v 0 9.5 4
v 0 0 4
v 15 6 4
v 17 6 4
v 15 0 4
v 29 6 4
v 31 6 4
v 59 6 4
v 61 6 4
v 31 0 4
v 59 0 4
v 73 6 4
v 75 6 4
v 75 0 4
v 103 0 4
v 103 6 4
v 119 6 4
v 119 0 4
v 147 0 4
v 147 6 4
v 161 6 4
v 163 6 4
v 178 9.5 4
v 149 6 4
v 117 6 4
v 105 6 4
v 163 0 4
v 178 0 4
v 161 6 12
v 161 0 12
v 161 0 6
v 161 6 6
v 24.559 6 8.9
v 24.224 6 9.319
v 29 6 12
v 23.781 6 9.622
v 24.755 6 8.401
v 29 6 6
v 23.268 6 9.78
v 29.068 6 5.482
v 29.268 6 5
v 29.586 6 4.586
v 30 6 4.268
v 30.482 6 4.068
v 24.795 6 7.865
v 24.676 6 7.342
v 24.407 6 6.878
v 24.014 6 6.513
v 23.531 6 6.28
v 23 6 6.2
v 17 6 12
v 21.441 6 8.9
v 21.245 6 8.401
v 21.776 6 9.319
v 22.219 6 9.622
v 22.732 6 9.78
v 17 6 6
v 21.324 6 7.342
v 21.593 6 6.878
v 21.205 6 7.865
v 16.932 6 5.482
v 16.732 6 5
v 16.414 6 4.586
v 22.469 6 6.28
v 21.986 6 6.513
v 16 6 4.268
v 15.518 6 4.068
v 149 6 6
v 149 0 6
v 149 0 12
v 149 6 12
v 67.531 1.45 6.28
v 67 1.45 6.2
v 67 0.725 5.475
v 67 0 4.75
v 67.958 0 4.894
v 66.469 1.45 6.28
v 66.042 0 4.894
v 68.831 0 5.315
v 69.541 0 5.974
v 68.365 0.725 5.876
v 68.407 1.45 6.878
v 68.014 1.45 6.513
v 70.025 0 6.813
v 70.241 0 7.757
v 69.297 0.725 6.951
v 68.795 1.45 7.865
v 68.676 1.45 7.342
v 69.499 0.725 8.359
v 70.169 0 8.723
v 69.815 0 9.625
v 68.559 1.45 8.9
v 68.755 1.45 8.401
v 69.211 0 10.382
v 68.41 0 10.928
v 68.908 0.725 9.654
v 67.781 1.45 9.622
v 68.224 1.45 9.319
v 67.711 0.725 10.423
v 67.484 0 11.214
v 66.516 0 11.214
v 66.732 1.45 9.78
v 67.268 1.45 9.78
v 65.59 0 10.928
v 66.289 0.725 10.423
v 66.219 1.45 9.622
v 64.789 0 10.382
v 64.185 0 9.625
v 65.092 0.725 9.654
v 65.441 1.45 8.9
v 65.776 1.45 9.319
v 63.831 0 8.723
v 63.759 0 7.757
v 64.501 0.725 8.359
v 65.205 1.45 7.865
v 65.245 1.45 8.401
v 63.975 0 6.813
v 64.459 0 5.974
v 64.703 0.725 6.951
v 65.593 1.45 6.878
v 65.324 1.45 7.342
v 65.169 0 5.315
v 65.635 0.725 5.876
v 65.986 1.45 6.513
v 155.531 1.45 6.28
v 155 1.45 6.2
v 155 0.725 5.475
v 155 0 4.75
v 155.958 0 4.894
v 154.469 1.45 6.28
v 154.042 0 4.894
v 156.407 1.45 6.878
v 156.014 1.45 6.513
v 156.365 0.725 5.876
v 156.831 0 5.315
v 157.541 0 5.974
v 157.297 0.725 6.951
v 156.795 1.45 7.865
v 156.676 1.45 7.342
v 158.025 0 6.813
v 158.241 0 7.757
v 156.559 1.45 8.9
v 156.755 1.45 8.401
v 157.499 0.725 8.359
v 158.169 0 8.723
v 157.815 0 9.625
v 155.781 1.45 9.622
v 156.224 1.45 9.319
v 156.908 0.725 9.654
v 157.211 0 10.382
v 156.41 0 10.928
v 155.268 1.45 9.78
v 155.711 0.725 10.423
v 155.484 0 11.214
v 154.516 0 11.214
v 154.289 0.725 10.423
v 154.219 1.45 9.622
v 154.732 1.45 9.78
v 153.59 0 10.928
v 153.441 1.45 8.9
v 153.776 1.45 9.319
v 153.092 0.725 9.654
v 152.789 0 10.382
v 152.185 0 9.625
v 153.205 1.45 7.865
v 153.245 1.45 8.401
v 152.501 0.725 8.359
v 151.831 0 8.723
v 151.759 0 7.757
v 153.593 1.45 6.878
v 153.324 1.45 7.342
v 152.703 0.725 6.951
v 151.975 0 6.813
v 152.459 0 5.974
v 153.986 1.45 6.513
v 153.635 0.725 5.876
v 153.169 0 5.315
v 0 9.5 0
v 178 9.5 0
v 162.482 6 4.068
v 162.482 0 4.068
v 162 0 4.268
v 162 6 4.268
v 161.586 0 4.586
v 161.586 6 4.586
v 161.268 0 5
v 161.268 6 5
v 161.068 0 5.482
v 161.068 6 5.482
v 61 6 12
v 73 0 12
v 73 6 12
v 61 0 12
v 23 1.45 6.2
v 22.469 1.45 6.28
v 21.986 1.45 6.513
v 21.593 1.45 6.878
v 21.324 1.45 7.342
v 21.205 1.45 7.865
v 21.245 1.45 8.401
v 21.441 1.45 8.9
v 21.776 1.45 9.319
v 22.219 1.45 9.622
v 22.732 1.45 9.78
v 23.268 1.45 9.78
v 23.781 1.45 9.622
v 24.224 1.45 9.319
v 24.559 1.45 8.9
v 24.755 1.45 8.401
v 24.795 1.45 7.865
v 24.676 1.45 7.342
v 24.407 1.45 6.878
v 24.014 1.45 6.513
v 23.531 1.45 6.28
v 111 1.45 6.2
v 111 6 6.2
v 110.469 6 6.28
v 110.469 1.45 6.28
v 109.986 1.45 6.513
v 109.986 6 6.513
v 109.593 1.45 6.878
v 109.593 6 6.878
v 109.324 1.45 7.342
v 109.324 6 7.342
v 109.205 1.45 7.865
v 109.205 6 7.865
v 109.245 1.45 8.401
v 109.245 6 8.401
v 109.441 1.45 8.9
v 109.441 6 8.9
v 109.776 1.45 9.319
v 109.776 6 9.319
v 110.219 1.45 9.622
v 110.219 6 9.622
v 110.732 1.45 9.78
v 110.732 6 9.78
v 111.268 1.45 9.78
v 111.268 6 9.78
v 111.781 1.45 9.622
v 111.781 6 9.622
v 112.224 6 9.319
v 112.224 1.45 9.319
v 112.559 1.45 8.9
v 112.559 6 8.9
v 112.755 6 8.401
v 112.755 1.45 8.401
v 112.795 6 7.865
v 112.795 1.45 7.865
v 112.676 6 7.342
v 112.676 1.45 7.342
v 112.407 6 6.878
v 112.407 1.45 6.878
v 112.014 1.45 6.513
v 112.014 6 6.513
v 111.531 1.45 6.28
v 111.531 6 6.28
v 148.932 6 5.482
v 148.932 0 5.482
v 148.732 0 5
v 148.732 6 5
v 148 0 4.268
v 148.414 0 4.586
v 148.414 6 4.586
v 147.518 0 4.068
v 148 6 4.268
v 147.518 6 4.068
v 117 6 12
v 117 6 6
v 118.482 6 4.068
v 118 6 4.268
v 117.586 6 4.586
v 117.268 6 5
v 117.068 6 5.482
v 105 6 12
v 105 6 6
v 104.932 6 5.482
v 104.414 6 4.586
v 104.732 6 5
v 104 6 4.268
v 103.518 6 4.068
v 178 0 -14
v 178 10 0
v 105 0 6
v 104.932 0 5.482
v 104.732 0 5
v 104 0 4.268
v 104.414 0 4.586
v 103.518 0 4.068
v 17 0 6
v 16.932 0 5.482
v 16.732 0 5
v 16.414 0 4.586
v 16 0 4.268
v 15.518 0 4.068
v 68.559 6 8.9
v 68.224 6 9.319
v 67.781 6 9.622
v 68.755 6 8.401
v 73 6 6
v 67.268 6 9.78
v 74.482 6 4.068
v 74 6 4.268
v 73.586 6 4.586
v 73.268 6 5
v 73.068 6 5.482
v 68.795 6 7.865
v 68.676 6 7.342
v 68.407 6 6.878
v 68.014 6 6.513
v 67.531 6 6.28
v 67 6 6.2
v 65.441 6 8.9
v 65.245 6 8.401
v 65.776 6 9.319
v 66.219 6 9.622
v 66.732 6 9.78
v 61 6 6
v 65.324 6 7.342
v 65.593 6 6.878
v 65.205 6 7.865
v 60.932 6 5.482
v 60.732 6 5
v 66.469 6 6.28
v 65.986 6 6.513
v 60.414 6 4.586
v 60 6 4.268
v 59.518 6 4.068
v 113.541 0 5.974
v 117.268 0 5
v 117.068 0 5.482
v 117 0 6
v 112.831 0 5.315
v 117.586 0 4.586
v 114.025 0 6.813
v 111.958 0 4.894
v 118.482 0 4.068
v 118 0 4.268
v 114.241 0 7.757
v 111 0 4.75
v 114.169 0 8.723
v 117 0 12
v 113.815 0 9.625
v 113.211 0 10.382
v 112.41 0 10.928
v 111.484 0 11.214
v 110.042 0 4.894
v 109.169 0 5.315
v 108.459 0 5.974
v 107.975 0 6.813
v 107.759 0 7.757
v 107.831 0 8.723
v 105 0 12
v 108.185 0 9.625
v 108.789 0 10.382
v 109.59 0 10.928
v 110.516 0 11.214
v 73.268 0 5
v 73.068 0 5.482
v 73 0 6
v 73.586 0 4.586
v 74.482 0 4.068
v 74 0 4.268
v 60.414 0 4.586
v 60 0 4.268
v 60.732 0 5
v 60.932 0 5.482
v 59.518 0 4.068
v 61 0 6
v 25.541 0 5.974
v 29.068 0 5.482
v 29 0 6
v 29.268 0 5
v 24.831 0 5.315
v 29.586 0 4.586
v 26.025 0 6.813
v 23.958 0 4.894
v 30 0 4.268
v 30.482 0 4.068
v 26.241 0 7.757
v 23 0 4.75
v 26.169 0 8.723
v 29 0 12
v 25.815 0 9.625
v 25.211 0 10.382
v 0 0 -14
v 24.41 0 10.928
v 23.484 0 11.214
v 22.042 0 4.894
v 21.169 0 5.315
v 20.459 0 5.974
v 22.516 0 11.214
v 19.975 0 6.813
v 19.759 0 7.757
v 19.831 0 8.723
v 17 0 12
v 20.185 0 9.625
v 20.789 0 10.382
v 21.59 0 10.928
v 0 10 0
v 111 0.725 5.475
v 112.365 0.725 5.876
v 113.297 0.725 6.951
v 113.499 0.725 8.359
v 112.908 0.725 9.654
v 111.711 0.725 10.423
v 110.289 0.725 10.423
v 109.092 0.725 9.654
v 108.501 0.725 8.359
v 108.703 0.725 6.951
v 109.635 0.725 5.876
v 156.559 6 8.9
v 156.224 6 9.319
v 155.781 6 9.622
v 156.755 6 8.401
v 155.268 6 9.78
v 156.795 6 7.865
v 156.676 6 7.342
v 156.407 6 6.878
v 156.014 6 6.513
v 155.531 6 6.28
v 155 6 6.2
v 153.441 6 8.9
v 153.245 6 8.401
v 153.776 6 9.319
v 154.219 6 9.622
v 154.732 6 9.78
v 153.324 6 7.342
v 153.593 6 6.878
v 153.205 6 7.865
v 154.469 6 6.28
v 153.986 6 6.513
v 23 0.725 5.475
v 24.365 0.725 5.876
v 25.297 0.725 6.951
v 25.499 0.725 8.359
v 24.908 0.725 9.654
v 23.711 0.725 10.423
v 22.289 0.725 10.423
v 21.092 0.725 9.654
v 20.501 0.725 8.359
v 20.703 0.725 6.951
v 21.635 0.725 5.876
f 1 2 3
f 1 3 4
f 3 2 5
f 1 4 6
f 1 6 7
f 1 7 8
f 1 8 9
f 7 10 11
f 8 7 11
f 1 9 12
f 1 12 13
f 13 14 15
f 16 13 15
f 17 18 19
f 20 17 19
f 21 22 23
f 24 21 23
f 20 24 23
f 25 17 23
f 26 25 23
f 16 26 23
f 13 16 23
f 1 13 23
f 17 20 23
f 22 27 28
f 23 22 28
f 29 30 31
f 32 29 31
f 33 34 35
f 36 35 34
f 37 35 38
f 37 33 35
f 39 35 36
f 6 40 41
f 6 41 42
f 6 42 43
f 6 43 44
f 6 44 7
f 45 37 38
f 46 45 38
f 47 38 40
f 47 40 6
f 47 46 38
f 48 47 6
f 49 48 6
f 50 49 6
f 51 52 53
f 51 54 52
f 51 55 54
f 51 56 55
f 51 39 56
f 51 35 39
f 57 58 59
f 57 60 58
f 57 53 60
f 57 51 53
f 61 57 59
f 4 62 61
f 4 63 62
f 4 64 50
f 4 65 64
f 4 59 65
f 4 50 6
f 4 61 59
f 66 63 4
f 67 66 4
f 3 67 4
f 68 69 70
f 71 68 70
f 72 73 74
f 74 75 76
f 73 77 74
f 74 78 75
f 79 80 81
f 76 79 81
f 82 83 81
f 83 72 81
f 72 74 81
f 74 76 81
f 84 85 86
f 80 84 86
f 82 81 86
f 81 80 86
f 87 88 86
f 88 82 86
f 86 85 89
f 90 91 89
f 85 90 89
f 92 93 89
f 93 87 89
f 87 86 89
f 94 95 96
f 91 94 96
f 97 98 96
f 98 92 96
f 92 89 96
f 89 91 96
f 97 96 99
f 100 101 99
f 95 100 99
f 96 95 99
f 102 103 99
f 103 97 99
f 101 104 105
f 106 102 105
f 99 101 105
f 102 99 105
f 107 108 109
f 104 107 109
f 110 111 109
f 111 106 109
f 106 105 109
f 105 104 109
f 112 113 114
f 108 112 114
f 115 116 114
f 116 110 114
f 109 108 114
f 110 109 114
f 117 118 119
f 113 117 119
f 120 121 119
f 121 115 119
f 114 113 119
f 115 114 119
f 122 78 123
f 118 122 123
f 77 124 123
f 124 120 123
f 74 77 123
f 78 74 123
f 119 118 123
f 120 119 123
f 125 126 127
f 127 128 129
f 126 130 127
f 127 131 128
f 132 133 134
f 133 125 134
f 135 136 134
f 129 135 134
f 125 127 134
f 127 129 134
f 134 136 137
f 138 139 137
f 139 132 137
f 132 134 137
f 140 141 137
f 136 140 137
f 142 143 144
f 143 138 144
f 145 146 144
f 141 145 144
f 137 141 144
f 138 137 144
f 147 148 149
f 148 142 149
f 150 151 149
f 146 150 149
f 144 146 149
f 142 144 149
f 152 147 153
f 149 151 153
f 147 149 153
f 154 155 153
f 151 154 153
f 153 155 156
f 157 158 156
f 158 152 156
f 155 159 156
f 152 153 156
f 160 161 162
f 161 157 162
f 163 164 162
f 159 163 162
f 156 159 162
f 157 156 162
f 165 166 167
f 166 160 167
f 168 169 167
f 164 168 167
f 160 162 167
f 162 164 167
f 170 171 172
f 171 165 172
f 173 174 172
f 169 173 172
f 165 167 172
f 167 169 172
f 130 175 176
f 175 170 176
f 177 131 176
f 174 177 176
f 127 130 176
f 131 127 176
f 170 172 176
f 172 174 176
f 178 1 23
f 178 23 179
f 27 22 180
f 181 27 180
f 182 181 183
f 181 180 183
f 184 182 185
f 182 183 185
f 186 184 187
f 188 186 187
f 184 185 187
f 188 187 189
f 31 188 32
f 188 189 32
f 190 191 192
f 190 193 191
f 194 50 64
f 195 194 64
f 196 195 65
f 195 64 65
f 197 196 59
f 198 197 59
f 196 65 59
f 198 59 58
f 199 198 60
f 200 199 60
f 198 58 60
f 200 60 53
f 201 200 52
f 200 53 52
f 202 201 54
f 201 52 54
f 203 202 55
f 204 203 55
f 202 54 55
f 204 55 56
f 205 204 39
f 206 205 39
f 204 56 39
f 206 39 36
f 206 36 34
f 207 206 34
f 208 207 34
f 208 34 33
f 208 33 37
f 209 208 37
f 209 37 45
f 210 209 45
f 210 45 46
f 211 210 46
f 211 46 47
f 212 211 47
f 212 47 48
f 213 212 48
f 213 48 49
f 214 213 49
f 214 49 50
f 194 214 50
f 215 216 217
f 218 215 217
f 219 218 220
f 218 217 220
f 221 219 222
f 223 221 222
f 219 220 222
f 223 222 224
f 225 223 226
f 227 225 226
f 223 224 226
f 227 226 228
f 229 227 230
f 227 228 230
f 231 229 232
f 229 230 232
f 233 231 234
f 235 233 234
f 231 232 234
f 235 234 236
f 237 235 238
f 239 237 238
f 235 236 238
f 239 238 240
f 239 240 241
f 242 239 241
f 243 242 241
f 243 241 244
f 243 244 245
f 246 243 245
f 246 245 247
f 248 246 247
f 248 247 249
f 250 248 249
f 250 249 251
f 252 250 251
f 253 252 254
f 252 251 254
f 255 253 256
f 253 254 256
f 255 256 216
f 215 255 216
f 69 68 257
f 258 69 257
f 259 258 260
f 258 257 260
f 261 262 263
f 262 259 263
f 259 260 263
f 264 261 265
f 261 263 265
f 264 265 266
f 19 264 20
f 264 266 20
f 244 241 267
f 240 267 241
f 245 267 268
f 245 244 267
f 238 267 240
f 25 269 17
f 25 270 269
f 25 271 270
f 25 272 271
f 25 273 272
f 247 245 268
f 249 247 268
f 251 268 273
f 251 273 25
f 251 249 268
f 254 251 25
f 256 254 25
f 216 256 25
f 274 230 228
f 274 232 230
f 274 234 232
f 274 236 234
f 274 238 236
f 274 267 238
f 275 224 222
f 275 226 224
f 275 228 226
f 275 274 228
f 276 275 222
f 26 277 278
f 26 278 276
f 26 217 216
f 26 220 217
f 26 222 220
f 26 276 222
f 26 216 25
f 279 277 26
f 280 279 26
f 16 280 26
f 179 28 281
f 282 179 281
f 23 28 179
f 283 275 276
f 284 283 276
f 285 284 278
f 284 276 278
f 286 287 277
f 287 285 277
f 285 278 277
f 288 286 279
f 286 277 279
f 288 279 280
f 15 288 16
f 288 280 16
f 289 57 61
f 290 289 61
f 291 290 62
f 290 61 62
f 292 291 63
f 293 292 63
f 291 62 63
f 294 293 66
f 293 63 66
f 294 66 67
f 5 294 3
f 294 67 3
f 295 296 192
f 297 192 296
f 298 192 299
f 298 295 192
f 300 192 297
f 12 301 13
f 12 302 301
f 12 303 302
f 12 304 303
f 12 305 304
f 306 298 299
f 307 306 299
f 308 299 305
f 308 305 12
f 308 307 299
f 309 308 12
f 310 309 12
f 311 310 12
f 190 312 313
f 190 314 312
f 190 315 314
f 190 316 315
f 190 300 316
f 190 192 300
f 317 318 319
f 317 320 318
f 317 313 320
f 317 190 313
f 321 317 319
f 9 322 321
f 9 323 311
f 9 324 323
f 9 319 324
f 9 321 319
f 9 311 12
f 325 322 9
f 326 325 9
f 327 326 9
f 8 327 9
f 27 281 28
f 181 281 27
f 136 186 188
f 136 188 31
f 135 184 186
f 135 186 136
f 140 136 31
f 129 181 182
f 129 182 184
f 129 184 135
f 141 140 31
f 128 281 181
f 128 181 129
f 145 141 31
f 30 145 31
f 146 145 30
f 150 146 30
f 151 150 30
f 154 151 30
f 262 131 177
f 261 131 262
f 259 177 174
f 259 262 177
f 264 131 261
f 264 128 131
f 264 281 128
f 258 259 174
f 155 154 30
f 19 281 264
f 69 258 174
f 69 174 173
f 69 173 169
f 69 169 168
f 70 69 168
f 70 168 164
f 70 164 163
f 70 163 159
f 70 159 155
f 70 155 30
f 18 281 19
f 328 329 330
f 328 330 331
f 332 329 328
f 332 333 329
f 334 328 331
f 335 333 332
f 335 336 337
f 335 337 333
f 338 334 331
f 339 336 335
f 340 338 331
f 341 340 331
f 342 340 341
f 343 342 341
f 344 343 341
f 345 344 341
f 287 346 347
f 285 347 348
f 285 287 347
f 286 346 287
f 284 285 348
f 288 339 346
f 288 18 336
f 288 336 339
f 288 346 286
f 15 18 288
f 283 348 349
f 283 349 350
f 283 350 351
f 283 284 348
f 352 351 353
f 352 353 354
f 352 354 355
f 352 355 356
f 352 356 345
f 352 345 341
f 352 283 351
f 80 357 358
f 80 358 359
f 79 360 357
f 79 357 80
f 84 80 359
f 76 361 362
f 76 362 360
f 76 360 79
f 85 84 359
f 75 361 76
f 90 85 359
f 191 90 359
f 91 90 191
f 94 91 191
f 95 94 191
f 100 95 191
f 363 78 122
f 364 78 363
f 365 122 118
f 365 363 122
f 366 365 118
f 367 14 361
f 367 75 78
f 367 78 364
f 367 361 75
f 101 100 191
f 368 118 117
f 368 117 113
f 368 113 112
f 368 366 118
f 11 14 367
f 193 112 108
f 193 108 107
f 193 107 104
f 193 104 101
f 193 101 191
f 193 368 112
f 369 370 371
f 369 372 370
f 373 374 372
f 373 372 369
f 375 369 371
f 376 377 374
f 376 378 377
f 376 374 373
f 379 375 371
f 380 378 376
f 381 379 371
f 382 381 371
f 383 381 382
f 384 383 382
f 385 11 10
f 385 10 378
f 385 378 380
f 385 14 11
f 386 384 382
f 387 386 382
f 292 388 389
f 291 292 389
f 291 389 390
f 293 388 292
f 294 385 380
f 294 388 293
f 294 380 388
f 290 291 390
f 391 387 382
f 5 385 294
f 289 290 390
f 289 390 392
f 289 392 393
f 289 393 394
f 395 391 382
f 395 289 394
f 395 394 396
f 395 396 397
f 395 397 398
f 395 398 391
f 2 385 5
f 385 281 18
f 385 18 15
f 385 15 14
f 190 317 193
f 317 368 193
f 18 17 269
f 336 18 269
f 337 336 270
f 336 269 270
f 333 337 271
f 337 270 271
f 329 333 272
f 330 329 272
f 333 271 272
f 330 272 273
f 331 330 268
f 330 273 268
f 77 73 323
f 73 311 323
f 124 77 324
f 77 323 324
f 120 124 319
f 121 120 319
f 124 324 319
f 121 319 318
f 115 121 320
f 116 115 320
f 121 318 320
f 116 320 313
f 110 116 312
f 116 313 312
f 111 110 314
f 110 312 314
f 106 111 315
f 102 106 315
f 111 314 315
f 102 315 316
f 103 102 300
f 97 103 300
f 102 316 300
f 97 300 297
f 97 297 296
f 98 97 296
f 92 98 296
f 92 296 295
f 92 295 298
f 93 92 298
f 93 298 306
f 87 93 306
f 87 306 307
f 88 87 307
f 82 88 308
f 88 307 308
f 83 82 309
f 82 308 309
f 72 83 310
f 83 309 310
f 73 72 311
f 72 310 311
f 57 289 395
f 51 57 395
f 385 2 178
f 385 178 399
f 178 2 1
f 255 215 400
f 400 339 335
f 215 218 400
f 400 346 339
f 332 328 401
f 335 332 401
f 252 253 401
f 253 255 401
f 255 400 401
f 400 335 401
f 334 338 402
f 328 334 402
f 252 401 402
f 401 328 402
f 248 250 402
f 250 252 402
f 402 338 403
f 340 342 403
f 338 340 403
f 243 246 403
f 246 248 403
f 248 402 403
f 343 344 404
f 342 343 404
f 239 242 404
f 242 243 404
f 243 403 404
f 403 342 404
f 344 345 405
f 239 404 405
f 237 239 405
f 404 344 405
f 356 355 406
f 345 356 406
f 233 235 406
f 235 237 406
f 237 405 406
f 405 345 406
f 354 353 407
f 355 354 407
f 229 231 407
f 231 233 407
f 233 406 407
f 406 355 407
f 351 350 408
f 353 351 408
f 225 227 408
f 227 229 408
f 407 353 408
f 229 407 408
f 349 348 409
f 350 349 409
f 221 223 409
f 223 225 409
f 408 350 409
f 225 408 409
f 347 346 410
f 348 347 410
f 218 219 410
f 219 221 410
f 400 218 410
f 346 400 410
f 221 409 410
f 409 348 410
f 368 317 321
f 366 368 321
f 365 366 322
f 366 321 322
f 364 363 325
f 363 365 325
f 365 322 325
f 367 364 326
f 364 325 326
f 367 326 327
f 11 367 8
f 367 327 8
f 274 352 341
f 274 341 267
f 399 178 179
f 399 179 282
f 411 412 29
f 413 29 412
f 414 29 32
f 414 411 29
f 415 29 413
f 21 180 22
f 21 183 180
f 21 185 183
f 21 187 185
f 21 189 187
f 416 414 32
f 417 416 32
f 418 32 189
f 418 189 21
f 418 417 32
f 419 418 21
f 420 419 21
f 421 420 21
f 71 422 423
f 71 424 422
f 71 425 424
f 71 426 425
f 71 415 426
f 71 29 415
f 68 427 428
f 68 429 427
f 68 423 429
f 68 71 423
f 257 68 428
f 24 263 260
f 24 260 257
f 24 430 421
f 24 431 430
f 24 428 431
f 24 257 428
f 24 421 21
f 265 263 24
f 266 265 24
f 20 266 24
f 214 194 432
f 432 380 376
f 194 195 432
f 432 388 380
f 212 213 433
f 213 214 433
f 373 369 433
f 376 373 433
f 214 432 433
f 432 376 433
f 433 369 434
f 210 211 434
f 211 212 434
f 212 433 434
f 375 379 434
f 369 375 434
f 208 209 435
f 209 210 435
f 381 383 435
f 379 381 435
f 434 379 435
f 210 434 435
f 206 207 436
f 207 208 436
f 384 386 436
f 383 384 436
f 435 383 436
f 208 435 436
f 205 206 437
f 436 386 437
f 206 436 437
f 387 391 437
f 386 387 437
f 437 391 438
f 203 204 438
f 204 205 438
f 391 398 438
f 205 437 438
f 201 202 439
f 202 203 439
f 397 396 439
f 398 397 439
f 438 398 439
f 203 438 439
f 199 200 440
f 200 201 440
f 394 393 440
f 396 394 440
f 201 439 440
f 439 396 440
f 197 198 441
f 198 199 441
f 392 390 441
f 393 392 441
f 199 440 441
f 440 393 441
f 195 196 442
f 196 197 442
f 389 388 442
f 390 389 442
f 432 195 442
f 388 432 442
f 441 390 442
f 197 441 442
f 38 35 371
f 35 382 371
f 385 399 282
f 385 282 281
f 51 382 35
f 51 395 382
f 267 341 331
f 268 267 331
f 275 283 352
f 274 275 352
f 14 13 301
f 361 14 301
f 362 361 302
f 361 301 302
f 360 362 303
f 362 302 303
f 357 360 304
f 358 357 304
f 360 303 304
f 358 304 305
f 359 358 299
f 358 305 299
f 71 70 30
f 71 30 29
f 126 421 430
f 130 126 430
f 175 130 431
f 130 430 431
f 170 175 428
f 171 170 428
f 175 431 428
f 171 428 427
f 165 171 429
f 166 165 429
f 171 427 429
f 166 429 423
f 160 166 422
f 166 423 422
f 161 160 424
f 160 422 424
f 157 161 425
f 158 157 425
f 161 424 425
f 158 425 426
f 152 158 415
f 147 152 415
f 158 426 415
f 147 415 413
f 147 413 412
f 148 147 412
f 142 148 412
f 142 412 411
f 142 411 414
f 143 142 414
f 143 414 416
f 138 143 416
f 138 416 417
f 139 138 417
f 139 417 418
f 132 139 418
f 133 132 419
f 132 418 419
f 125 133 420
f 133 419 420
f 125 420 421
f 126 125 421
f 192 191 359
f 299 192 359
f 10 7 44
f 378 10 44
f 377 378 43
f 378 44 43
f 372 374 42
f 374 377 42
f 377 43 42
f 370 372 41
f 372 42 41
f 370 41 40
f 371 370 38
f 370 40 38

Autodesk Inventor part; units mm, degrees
ref_plane "YZ Plane" through (0, 0, 0) normal (1, 0, 0) x (0, 1, 0)
ref_plane "XZ Plane" through (0, 0, 0) normal (0, 1, 0) x (-1, 0, 0)
ref_plane "XY Plane" through (0, 0, 0) normal (0, 0, 1) x (1, 0, 0)
sketch "Sketch3" plane through (0, 0, 0) normal (1, 0, 0) x (0, 1, 0)
  line L0 (0, 0) -> (10, 0)
  line L1 (10, 0) -> (10, -14)
  line L2 (10, -14) -> (0, -14)
  line L3 (0, -14) -> (0, 0)
  line L4 (10, 0) -> (0, -14)
  line L5 (6, 0) -> (0, 0)
  line L6 (0, 0) -> (0, 12)
  line L7 (0, 12) -> (6, 12)
  line L8 (6, 12) -> (6, 0)
  line L9 (9.5, 0) -> (6, 0)
  line L10 (6, 0) -> (6, 4)
  line L11 (6, 4) -> (9.5, 4)
  line L12 (9.5, 4) -> (9.5, 0)
  dimension "d30" = 12
  dimension "d31" = 6
  dimension "d63" = 10
  dimension "d74" = 0.5
  dimension "d75" = 4
  dimension "d76" = 3.5
  dimension "d141" = 35.538
  dimension "d142" = 14
extrude "Extrusion2" add sketch "Sketch3" along normal blind 178 contours L6 L7 L8 L0 | L0 L4 L3 | L8 L11 L12 L0
sketch "Sketch10" plane through (0, 0, -14) normal (0, -1, 0) x (1, 0, 0)
  line L0 (0, 18) -> (0, 26) projected
  line L1 (0, 26) -> (178, 26) projected
  line L2 (178, 18) -> (178, 26) projected
  line L3 (0, 18) -> (178, 18) projected
  line L4 (0, 14) -> (0, 18) projected
  line L5 (0, 18) -> (17, 18)
  line L6 (17, 18) -> (17, 26)
  line L7 (17, 26) -> (0, 26)
  line L8 (0, 26) -> (0, 18)
  line L9 (0, 18) -> (178, 18) projected
  line L10 (178, 26) -> (161, 26)
  line L11 (161, 26) -> (161, 18)
  line L12 (161, 18) -> (178, 18)
  line L13 (178, 18) -> (178, 26)
  line L14 (17, 26) -> (29, 26)
  line L15 (29, 26) -> (29, 18)
  line L16 (29, 18) -> (17, 18)
  line L17 (17, 18) -> (17, 26)
  line L18 (61, 26) -> (73, 26)
  line L19 (73, 26) -> (73, 18)
  line L20 (73, 18) -> (61, 18)
  line L21 (61, 18) -> (61, 26)
  line L22 (105, 26) -> (117, 26)
  line L23 (117, 26) -> (117, 18)
  line L24 (117, 18) -> (105, 18)
  line L25 (105, 18) -> (105, 26)
  line L26 (149, 26) -> (161, 26)
  line L27 (161, 26) -> (161, 18)
  line L28 (161, 18) -> (149, 18)
  line L29 (149, 18) -> (149, 26)
  line L30 (17, 26) -> (29, 18)
  line L31 (29, 26) -> (17, 18)
  line L32 (61, 26) -> (73, 18)
  line L33 (73, 26) -> (61, 18)
  line L34 (105, 26) -> (117, 18)
  line L35 (117, 26) -> (105, 18)
  line L36 (149, 26) -> (161, 18)
  line L37 (161, 26) -> (149, 18)
  point P0 (105, 18)
  point P1 (23, 22)
  point P2 (67, 22)
  point P3 (111, 22)
  point P4 (155, 22)
  dimension "d118" = 17
  dimension "d119" = 17
  dimension "d120" = 12
  dimension "d121" = 12
  dimension "d122" = 12
  dimension "d123" = 12
  dimension "d124" = 0
  dimension "d125" = 0
  dimension "d126" = 32
  dimension "d129" = 32
  dimension "d130" = 32
extrude "Extrusion5" cut sketch "Sketch10" against normal up to next contours L0 L1 L6 L3 | L15 L1 L21 L3 | L19 L1 L25 L3 | L23 L1 L29 L3 | L11 L1 L2 L3
hole "Hole4" at (23, 0, 8) at (67, 0, 8) at (111, 0, 8) at (155, 0, 8) direction (0, 1, 0) diameter 3.6 end through all countersink diameter 6.5 countersink angle 90 clearance for "Countersunk Flat Head Screw ISO 2009/7046" size "M3" standard "ISO"
fillet "Fillet2" radius 2 8 edges at (17, 3, 4) (29, 3, 4) (61, 3, 4) (73, 3, 4) (105, 3, 4) (117, 3, 4) (149, 3, 4) (161, 3, 4)
equation "\"d126\" = d130"
equation "\"d129\" = d130"
properties part number "plog" material "Steel, Alloy"
